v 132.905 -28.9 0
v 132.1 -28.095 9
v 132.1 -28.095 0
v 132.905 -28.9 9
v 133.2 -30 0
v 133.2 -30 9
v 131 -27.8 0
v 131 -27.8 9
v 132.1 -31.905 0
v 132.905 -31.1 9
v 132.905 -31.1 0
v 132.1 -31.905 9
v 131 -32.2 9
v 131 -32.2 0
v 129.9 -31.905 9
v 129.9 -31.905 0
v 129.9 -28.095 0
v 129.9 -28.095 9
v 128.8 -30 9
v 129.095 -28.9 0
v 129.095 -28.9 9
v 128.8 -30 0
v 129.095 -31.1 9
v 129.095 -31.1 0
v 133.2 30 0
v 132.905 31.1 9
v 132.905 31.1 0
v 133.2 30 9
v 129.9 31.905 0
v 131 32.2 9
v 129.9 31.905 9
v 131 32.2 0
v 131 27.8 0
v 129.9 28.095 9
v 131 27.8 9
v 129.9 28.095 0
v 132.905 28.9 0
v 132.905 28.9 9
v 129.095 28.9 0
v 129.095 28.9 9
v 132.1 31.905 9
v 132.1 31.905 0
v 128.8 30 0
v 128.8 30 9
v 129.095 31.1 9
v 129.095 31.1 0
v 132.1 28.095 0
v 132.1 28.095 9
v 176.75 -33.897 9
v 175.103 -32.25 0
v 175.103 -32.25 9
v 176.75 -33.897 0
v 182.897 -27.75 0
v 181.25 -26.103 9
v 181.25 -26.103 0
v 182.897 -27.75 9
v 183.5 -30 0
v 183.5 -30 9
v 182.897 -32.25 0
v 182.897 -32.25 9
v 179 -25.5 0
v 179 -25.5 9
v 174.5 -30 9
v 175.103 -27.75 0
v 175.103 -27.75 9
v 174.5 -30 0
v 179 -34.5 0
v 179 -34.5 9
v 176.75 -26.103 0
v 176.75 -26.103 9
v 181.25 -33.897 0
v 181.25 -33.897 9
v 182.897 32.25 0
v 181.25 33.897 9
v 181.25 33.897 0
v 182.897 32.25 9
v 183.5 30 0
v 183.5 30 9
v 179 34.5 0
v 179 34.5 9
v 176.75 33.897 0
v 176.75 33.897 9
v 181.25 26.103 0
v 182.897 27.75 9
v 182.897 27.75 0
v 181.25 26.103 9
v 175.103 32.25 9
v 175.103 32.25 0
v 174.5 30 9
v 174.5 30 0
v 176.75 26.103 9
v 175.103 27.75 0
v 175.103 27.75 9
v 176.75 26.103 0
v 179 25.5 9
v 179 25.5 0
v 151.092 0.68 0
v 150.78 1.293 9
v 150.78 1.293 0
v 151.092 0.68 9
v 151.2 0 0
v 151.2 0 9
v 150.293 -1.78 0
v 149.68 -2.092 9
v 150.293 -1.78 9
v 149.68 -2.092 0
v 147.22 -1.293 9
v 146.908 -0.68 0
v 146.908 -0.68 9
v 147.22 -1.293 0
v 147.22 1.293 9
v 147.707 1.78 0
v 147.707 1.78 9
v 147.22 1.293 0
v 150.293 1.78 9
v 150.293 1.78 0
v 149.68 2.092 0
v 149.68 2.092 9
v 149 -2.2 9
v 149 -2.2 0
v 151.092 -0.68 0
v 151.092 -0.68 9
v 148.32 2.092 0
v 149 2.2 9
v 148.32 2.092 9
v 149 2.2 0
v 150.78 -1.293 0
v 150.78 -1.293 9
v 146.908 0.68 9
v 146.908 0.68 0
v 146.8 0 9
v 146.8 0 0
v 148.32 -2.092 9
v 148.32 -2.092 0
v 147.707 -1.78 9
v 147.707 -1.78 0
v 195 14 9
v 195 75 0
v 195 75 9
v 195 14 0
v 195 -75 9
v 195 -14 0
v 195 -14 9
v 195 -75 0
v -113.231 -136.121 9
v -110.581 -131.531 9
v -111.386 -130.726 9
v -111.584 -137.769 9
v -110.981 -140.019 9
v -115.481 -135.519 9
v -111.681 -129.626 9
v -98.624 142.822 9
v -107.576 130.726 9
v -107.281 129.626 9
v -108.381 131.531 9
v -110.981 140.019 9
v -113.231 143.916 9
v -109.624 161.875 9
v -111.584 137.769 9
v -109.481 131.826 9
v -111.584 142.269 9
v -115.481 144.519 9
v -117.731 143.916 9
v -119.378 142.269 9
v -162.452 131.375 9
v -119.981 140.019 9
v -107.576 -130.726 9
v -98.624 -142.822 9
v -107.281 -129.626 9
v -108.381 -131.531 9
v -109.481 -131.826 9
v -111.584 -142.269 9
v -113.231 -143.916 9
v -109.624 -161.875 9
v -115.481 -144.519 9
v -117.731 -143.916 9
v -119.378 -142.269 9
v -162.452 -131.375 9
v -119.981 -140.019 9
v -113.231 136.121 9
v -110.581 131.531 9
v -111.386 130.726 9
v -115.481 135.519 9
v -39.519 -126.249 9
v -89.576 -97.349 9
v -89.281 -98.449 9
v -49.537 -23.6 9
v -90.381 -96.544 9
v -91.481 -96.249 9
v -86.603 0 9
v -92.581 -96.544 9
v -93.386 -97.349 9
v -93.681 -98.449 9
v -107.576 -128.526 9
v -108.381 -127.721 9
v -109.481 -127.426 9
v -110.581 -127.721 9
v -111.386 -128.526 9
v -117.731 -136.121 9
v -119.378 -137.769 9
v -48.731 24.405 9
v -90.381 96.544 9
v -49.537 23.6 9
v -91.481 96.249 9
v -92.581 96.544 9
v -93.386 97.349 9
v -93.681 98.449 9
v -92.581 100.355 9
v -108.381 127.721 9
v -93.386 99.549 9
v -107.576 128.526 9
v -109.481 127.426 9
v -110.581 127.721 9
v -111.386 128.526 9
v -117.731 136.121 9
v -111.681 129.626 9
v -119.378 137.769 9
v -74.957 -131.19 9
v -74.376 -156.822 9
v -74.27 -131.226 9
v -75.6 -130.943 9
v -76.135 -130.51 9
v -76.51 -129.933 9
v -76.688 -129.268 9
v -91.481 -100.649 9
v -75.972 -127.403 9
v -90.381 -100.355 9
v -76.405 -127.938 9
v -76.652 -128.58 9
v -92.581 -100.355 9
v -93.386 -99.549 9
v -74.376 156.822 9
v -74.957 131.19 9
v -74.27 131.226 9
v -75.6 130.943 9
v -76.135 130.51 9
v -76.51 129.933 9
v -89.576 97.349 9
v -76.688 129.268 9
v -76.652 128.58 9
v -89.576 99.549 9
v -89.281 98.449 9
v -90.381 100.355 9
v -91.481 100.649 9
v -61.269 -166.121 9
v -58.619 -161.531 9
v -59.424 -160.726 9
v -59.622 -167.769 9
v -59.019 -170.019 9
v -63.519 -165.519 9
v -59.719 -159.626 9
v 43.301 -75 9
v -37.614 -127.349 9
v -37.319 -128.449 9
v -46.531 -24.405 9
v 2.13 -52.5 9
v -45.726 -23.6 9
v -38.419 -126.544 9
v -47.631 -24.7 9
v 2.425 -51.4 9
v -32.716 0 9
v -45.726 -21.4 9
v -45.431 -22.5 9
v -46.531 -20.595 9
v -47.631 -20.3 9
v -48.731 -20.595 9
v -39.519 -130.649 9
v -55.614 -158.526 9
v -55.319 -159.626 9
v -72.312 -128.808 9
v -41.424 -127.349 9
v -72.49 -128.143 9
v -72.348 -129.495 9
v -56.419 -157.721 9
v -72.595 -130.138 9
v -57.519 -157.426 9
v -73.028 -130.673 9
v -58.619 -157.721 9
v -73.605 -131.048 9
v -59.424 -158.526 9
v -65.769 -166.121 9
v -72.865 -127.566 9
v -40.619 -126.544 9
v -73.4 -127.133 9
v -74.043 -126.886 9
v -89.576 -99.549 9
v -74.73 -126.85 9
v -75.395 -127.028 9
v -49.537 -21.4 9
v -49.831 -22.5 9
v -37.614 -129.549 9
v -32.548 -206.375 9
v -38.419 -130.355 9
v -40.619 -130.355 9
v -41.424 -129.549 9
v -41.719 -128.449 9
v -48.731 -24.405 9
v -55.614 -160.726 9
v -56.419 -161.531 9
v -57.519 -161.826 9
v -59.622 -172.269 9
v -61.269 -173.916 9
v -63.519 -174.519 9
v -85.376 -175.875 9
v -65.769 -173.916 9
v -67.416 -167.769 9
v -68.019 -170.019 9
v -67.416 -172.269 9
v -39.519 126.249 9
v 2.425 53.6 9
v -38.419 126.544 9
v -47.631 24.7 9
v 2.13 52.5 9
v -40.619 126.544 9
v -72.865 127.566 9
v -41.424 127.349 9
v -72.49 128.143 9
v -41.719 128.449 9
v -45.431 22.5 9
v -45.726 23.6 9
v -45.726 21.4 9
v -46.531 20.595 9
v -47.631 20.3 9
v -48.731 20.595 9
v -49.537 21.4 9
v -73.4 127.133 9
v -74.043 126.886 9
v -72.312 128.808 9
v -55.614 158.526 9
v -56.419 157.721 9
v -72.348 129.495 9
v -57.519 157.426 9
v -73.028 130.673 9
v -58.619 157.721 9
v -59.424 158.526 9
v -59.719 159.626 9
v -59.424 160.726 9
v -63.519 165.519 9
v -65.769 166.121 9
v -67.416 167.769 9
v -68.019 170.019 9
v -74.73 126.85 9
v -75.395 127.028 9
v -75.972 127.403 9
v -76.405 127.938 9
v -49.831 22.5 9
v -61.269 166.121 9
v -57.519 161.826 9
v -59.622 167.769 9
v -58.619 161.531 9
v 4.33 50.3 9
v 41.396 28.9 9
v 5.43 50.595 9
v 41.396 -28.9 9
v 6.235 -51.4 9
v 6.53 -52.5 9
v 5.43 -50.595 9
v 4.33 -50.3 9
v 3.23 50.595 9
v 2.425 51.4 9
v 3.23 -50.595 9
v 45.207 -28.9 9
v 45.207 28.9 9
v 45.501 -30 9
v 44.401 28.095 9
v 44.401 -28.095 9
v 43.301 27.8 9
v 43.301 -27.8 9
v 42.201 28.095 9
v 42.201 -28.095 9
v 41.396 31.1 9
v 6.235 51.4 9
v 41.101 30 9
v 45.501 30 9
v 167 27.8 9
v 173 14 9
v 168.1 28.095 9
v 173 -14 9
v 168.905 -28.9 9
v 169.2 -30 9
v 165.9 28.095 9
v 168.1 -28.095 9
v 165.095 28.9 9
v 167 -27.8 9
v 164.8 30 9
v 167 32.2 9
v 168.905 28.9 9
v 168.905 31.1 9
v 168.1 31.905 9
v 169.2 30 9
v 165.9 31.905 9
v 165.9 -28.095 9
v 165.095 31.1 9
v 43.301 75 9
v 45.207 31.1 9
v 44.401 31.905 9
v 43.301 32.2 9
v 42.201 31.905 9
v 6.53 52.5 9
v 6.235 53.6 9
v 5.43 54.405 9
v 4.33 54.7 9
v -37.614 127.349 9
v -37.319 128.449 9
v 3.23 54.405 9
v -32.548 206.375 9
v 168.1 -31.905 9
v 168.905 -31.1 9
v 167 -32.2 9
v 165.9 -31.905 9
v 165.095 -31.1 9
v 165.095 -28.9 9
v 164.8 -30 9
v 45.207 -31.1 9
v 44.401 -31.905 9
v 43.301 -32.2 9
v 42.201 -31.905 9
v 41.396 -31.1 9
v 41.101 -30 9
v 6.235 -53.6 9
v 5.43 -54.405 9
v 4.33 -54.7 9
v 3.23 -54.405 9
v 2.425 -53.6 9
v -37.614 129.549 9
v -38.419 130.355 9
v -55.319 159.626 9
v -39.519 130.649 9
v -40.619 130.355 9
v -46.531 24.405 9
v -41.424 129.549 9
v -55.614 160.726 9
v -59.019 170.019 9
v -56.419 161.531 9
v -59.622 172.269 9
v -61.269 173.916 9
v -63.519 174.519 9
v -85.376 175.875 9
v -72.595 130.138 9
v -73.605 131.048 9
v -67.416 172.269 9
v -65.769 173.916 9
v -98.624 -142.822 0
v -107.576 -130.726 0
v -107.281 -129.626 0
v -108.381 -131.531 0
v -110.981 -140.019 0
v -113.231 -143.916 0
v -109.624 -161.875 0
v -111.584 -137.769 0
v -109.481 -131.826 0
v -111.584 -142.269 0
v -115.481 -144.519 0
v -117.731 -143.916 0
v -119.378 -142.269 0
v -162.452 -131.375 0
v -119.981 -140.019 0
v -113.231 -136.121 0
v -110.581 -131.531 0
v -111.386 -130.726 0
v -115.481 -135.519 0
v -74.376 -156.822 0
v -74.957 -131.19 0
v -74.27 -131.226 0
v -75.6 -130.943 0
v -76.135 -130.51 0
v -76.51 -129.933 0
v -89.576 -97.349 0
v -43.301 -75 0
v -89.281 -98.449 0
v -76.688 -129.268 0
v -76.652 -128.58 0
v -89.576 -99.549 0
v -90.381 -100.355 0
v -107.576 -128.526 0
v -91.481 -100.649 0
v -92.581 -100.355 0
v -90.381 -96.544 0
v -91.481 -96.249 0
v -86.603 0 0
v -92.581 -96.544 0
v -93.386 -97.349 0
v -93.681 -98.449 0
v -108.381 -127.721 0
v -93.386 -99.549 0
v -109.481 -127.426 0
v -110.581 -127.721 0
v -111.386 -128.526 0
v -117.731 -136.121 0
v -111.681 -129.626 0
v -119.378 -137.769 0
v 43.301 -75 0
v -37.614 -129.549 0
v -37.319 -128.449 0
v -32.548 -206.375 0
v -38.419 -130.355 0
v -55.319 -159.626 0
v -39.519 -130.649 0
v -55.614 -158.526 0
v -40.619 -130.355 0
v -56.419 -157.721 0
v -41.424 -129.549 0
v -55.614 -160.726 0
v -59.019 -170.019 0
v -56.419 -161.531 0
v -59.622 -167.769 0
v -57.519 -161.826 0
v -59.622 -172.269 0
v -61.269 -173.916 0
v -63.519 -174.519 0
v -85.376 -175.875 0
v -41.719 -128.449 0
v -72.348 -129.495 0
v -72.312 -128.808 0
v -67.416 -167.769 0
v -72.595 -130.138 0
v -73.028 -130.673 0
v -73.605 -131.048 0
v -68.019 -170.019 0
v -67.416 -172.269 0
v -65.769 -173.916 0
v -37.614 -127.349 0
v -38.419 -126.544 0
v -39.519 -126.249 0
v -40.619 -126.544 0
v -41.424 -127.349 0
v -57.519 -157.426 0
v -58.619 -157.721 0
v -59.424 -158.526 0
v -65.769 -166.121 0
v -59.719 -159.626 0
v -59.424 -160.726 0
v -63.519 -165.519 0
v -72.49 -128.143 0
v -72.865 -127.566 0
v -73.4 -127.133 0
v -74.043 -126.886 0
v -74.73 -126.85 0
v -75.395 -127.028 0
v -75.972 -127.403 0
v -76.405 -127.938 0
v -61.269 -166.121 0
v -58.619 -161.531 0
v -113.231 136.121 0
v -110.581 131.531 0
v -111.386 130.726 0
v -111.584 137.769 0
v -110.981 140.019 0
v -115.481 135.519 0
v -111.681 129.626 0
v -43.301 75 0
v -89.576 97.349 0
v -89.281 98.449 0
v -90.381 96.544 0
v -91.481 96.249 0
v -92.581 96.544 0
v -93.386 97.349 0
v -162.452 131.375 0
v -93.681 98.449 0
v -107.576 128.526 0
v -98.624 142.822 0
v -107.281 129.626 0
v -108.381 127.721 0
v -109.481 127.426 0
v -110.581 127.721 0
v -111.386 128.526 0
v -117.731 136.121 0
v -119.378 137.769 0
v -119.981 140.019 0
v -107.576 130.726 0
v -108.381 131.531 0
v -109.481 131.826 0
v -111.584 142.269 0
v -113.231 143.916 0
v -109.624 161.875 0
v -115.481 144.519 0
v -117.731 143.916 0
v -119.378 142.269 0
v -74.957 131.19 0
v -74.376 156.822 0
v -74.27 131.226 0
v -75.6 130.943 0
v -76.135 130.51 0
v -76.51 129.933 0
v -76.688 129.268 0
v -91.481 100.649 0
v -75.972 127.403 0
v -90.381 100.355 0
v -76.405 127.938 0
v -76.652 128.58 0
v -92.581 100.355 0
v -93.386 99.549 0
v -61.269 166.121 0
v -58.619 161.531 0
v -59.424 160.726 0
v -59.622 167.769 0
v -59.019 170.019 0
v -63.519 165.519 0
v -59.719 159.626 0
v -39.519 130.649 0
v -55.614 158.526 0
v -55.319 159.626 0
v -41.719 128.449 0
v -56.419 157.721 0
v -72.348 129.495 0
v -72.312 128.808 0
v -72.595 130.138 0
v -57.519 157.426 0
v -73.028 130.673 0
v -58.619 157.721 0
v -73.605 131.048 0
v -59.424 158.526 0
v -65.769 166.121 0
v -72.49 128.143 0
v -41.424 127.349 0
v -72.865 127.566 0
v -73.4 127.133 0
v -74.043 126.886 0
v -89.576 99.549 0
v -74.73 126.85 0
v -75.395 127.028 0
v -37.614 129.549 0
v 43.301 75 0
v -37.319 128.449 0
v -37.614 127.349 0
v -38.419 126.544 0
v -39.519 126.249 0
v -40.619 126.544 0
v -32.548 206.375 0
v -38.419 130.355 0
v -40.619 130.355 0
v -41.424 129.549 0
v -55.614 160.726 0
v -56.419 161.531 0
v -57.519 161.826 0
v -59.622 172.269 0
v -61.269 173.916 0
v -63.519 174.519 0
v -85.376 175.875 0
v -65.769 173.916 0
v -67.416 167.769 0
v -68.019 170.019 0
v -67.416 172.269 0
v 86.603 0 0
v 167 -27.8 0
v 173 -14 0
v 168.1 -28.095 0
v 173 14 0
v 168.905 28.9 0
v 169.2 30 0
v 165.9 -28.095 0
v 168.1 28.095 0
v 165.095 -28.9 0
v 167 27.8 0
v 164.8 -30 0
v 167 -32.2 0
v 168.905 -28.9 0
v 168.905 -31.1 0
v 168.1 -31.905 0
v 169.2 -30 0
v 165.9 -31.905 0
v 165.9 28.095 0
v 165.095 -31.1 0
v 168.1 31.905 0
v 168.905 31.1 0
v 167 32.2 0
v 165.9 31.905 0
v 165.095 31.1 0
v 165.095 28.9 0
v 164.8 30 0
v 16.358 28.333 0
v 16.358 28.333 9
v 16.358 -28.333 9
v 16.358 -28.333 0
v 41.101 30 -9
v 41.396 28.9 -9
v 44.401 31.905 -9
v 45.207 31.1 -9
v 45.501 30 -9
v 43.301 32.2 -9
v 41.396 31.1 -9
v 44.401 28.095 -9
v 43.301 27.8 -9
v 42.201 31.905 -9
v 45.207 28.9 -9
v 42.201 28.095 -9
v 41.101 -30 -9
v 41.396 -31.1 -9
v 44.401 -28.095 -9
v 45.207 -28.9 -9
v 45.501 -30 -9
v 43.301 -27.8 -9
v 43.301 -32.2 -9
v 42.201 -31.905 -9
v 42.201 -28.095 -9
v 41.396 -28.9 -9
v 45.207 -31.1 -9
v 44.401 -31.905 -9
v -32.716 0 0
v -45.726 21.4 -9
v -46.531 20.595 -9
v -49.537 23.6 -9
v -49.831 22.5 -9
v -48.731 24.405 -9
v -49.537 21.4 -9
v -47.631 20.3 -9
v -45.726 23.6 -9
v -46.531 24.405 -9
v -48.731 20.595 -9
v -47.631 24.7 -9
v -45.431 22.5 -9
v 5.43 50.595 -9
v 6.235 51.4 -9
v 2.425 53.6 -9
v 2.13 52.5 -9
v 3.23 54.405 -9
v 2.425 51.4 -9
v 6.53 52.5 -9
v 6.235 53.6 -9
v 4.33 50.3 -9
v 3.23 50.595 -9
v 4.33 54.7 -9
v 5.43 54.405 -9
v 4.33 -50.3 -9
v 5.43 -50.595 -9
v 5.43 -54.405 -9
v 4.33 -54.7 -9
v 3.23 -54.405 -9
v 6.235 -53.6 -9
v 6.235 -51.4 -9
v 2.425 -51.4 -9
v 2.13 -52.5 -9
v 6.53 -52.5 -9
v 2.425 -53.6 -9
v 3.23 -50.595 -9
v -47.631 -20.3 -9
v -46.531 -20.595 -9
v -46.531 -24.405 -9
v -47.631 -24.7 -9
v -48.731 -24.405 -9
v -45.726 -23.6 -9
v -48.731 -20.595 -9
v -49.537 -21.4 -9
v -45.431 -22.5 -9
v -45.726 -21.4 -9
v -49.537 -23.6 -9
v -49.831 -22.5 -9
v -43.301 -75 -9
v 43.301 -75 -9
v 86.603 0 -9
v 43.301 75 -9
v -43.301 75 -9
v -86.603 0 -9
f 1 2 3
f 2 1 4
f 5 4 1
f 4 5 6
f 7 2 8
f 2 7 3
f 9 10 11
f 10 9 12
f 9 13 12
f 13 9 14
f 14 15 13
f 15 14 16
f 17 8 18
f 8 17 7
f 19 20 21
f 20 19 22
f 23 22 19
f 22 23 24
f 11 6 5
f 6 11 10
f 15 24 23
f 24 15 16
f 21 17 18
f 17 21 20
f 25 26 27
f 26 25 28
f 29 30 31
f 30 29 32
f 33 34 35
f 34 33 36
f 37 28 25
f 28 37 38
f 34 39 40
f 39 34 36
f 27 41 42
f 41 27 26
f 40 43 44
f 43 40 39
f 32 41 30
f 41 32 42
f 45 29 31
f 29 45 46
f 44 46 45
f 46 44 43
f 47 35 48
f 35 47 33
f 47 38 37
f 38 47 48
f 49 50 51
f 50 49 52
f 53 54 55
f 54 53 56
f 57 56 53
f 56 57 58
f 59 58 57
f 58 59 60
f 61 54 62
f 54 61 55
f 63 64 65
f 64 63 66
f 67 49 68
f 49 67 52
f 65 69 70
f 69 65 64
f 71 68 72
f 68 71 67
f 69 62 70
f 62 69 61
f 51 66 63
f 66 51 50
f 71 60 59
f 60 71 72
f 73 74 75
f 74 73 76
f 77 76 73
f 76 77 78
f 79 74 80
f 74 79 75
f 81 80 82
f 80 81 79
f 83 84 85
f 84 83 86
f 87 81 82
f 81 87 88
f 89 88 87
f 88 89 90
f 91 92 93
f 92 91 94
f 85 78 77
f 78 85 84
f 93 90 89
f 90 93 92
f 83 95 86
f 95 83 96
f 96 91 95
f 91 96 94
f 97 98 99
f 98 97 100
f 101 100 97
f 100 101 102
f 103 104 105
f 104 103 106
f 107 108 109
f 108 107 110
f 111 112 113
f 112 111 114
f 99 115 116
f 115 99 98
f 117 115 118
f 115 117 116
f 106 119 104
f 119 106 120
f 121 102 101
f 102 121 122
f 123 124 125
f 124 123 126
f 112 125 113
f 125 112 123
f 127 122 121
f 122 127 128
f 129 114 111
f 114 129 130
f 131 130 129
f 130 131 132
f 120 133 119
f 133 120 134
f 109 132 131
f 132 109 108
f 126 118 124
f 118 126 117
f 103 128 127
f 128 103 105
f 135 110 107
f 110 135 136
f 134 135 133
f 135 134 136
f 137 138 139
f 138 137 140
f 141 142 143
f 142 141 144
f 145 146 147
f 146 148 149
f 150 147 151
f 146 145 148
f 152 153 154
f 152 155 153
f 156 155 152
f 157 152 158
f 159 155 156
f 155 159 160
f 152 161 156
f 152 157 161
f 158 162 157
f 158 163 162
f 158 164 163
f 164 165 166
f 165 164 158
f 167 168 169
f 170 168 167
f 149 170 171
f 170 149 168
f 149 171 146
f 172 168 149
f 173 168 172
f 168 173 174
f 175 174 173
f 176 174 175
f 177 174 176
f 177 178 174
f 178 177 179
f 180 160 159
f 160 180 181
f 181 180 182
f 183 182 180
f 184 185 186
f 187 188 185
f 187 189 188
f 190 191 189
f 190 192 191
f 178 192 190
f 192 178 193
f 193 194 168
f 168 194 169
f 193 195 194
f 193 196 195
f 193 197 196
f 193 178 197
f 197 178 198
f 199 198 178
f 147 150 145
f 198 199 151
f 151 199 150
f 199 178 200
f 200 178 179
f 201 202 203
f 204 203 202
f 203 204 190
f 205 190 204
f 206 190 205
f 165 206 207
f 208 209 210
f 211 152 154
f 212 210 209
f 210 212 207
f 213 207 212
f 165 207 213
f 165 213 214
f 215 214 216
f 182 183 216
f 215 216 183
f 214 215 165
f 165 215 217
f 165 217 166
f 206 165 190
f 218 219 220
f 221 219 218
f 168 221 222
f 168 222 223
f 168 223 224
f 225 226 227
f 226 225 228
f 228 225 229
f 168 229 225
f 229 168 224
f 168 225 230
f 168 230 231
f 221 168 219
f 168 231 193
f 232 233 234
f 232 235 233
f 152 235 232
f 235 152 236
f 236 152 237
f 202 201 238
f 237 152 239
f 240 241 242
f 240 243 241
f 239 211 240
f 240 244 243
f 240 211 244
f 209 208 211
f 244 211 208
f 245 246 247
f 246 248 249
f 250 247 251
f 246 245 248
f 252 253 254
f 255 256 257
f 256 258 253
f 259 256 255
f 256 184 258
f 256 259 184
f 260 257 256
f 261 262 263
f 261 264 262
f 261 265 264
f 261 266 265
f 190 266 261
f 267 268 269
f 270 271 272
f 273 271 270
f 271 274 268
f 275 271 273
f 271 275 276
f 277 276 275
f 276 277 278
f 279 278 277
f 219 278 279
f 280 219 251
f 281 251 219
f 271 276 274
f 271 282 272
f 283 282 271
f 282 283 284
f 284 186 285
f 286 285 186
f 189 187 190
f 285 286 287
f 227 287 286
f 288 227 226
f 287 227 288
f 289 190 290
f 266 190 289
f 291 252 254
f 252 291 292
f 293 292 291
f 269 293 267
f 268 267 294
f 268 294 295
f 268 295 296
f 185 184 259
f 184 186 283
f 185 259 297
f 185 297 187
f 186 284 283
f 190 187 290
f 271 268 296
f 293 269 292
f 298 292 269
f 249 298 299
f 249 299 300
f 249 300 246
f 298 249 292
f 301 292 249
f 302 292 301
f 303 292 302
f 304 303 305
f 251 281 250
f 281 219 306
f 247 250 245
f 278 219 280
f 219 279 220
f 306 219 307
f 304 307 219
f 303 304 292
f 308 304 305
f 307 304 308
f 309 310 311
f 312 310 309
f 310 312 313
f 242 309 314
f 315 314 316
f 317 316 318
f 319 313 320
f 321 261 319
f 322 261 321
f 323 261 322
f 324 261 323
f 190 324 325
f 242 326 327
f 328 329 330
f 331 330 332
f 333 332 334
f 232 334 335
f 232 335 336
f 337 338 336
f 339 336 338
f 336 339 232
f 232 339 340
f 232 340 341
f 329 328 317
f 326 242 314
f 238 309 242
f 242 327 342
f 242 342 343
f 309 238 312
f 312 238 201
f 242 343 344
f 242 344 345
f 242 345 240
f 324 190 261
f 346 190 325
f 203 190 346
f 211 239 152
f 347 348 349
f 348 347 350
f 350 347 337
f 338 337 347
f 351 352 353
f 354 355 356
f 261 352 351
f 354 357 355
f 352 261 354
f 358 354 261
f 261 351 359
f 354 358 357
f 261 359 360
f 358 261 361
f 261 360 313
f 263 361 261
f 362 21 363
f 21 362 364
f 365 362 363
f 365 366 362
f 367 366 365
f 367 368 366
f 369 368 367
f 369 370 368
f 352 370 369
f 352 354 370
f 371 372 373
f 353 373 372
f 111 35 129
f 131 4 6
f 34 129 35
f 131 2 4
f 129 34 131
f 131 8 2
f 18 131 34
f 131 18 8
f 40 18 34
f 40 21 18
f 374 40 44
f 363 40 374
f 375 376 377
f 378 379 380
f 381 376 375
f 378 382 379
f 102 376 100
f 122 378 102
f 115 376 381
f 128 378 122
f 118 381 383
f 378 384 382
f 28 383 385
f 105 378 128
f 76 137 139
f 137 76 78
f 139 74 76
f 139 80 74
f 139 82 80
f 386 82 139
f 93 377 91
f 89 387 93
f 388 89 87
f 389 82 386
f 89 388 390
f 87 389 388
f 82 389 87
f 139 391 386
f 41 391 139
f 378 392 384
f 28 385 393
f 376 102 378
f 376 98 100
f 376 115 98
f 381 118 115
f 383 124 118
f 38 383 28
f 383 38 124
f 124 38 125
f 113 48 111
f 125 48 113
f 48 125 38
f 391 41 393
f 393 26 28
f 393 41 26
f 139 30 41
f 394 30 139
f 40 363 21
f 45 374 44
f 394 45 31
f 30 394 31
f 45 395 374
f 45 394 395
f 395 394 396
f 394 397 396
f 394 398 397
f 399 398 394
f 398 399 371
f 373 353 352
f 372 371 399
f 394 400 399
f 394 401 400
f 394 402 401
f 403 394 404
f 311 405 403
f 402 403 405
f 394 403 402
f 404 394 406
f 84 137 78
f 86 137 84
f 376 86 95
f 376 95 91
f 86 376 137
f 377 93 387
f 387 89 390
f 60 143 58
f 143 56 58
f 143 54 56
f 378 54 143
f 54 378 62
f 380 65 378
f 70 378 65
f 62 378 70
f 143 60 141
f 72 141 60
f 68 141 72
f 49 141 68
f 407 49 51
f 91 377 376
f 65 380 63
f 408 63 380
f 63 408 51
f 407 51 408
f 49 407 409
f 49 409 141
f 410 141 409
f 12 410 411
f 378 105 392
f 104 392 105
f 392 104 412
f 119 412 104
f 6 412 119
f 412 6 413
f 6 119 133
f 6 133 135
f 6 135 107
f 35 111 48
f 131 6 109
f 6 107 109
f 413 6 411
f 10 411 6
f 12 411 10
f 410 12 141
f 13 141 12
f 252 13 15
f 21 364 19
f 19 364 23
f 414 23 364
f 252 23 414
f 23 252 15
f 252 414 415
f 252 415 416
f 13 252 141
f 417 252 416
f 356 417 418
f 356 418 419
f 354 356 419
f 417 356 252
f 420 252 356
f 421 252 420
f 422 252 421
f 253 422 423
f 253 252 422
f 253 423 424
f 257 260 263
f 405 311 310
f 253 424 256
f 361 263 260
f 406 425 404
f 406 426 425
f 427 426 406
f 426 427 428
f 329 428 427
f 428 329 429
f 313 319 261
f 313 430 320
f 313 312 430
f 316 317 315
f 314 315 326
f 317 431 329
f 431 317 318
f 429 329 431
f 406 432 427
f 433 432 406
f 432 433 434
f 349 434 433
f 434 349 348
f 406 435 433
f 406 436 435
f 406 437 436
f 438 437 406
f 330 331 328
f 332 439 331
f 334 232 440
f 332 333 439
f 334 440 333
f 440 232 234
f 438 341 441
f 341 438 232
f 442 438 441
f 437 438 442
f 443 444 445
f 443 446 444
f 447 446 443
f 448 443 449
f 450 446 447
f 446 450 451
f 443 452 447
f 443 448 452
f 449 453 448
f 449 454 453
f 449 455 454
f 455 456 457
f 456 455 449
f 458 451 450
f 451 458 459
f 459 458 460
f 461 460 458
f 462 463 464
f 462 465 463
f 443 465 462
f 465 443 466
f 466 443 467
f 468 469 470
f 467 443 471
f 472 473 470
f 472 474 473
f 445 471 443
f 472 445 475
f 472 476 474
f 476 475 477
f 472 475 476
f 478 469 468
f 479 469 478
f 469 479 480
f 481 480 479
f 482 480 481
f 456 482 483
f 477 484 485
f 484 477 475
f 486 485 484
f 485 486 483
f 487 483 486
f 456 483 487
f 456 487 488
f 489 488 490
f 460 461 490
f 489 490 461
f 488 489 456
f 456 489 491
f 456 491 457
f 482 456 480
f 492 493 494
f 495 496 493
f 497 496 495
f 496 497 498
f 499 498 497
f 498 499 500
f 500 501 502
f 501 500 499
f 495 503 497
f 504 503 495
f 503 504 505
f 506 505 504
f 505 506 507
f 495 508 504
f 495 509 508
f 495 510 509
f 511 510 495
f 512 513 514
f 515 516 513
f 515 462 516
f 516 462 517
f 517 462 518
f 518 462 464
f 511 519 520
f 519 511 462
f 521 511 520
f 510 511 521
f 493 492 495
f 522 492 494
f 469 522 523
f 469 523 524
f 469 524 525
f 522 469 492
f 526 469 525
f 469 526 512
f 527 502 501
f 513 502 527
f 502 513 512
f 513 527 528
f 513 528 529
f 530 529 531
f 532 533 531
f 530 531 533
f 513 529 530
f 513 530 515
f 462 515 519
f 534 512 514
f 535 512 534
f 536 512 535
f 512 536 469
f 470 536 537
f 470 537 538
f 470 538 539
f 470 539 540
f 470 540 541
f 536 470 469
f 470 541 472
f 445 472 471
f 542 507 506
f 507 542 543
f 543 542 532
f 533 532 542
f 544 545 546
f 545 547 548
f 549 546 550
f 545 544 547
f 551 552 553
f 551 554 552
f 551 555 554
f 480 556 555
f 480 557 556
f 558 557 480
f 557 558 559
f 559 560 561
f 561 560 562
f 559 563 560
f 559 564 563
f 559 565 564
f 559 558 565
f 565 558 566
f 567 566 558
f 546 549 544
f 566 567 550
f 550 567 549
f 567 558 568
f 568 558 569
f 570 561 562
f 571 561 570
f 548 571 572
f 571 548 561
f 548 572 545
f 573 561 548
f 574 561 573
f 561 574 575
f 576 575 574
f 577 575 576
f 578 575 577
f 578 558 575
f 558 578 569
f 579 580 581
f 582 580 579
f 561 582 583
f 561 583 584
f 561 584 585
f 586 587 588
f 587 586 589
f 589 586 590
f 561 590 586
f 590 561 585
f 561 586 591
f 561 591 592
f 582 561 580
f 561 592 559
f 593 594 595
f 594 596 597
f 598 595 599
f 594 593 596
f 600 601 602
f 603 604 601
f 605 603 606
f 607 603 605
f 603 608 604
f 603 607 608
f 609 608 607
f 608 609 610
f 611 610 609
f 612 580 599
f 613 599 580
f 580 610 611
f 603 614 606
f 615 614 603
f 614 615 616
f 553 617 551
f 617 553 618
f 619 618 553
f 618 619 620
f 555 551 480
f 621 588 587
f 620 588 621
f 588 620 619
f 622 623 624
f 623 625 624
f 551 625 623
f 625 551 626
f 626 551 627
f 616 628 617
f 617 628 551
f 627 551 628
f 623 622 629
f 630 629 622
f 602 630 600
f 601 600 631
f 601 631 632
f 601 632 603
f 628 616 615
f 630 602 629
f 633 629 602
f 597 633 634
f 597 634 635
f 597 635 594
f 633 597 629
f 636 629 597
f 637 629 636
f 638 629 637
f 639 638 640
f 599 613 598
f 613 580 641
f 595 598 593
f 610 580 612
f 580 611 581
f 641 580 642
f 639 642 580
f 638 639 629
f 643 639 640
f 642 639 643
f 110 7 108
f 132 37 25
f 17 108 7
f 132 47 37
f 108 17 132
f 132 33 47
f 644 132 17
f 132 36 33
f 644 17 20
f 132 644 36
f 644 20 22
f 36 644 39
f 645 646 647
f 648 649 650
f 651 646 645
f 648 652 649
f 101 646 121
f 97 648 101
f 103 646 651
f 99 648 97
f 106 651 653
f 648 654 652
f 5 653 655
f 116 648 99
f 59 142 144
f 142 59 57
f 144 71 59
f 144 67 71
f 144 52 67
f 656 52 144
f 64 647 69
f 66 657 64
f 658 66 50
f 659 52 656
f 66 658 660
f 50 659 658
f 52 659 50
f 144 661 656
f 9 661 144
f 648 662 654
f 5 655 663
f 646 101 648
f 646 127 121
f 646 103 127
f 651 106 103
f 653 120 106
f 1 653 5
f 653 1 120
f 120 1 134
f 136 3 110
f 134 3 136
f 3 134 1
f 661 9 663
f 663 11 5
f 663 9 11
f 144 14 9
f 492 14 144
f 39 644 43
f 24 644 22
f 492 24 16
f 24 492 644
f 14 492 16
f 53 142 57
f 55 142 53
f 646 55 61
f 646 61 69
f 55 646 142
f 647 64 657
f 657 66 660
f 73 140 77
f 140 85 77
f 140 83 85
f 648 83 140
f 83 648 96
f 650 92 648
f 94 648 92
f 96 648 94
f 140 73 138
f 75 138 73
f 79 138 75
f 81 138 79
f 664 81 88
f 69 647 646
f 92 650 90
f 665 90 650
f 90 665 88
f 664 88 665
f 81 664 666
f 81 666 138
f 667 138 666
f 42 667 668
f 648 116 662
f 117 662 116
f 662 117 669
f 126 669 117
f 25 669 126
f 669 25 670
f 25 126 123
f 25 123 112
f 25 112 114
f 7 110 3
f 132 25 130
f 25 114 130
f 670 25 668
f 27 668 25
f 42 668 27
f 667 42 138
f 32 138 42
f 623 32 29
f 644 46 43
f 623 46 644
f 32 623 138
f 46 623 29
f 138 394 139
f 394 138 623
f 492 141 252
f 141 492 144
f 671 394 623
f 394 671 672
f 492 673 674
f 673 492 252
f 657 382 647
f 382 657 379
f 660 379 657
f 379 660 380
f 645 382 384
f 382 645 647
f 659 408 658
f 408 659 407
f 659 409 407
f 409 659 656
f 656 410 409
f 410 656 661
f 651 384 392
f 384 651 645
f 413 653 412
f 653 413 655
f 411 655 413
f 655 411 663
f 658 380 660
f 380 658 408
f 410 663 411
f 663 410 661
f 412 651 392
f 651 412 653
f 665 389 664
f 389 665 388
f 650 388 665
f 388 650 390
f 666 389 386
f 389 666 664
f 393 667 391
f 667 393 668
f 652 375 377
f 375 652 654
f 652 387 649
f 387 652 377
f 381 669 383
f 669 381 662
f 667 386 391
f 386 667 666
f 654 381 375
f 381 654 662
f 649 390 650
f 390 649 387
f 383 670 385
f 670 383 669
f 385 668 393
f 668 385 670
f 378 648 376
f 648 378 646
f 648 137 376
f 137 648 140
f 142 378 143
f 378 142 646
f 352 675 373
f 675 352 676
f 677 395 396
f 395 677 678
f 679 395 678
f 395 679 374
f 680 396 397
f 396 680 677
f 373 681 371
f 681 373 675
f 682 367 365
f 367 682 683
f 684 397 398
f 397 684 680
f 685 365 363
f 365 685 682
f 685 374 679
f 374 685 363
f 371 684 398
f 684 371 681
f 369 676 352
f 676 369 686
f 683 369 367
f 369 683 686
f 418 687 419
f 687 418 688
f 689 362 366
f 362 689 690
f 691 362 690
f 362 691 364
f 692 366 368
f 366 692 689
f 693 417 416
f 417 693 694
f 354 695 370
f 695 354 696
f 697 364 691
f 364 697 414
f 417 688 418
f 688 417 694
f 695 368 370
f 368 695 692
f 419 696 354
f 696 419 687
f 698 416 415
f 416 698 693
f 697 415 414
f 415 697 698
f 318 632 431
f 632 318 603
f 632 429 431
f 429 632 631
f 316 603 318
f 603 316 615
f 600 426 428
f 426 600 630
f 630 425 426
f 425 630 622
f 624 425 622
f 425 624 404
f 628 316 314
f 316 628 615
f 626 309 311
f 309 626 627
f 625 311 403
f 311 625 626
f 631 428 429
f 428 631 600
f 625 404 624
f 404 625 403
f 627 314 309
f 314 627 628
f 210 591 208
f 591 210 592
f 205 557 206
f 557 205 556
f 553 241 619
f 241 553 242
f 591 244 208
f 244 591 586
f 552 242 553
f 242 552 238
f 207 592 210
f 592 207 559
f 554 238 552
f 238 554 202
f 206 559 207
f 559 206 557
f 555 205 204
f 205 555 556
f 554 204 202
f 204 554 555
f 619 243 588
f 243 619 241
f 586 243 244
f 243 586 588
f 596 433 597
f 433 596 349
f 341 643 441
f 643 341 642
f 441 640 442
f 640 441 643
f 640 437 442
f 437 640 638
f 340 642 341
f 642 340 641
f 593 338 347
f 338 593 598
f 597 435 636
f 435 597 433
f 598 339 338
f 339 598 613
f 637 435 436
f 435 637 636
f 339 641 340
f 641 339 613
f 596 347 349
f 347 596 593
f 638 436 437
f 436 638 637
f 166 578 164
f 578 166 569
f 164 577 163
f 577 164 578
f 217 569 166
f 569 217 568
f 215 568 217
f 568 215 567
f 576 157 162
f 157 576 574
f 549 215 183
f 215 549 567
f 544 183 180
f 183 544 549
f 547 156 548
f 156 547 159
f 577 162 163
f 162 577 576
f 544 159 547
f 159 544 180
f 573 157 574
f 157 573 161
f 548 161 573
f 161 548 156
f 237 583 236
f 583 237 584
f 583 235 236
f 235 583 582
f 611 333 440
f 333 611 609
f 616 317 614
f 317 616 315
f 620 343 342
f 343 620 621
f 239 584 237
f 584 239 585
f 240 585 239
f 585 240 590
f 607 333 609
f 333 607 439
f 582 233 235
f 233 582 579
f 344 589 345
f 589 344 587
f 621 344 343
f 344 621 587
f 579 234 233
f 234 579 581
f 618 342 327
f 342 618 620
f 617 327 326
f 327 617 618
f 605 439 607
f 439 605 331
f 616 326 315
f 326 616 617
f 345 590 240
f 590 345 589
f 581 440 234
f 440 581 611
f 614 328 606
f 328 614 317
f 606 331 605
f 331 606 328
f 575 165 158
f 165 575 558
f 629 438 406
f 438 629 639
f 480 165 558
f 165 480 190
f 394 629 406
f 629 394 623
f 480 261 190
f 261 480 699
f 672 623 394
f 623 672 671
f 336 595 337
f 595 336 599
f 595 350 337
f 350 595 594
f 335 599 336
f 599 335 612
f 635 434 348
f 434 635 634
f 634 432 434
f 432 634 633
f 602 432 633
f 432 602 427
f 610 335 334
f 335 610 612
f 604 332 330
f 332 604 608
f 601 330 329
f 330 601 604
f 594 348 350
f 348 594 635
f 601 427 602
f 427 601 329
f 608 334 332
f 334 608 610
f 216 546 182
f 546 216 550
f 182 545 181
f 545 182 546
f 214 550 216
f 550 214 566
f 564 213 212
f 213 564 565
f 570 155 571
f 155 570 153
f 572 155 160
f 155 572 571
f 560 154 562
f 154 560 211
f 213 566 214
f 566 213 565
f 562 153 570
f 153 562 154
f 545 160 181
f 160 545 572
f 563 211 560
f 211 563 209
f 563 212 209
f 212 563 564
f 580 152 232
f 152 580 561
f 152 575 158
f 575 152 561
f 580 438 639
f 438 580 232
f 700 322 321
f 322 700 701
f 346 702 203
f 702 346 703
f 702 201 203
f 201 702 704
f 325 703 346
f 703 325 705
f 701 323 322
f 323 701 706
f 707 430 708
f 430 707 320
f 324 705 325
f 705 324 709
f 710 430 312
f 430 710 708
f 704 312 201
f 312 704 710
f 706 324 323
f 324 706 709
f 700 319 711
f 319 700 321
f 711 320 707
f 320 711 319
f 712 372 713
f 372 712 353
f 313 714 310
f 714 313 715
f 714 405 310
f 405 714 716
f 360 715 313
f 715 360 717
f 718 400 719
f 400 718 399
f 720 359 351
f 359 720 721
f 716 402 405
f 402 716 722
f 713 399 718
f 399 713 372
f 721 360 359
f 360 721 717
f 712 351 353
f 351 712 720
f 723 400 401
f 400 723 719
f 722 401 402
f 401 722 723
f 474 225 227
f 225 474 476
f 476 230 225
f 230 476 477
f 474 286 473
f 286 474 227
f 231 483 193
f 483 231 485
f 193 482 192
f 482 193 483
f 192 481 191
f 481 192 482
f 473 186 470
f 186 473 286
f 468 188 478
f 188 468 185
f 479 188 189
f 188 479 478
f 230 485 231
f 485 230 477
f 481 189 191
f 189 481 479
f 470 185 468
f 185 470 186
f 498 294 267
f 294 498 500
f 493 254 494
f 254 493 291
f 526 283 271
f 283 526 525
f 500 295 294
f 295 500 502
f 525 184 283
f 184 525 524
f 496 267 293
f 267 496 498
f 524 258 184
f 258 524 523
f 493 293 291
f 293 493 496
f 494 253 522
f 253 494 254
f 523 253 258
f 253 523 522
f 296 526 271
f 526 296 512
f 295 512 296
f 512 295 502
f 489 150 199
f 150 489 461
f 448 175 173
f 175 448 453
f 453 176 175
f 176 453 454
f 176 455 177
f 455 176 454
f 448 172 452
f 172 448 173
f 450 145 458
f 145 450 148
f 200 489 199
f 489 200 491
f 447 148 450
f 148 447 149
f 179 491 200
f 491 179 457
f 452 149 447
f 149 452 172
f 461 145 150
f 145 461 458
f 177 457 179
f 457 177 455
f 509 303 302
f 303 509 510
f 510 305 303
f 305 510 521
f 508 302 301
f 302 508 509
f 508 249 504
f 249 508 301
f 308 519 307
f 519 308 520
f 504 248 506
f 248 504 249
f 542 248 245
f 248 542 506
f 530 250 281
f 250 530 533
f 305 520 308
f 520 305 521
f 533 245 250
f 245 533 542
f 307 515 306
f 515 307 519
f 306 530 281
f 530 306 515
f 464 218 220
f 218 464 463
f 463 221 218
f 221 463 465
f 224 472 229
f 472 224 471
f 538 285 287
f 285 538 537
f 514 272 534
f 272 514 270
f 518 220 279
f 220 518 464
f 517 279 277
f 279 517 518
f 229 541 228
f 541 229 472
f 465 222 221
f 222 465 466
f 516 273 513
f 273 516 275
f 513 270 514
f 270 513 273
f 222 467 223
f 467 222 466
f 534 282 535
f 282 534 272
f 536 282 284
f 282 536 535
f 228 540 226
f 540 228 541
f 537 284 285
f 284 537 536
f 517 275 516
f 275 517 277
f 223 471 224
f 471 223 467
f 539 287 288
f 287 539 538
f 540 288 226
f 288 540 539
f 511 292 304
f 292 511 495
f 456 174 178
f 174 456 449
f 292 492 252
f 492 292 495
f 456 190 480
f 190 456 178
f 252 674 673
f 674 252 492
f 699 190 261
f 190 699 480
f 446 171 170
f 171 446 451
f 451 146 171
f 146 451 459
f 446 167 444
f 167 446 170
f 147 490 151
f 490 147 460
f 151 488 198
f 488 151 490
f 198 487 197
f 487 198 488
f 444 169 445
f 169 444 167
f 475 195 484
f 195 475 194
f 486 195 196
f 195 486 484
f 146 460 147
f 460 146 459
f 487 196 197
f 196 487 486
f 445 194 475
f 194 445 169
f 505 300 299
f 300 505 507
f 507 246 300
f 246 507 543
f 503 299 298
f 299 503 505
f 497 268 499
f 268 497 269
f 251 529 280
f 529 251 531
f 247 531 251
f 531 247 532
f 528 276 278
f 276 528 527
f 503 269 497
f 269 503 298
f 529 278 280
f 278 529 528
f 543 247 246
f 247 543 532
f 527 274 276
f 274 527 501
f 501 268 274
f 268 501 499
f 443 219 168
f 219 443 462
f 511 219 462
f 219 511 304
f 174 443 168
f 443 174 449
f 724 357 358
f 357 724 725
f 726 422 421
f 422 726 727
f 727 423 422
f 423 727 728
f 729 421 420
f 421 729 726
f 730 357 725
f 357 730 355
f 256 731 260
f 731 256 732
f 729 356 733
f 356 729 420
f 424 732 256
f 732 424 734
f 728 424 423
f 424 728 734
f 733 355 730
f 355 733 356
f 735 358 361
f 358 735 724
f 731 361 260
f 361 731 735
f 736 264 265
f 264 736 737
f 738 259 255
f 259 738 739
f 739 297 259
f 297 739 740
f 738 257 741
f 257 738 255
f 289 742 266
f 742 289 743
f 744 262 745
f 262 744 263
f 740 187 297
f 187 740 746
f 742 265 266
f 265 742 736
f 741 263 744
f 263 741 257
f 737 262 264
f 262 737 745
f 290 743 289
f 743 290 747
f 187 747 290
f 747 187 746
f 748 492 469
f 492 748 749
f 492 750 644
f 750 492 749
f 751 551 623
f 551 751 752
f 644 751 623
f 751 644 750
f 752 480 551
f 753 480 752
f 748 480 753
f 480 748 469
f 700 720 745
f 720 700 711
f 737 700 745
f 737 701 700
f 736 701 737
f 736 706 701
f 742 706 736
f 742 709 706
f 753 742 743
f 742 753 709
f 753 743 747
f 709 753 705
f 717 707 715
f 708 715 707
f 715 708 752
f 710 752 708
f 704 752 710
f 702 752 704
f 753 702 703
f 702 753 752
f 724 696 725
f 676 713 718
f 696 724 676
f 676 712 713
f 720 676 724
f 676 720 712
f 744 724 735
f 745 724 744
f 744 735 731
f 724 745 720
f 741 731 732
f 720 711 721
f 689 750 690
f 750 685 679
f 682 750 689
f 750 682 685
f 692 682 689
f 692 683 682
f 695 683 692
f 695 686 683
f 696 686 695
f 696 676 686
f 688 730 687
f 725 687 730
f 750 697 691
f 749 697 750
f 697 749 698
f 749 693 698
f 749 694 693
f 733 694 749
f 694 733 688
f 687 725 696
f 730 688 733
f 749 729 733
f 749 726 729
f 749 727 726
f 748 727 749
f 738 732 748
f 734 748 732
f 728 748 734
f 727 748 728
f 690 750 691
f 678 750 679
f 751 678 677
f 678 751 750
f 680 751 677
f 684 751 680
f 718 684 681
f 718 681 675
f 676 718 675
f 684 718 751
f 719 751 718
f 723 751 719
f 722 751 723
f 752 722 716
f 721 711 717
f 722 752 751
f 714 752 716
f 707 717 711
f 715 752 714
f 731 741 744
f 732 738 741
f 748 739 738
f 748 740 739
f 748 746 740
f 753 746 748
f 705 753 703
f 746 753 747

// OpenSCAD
radius = 175; // pretty close to 150/cos(30)
radius2 = radius/cos(30);
extralength = 20;
belt_gap = 28;
offset = 0;
thickness = 9;
h2 = thickness*2+1;
boardwidth=150;
radius_c = boardwidth/(2*cos(30));

module single_board(bottom) {
boardlength=radius+extralength;
	difference() {
		translate([boardlength/2,0,thickness/2])
		  cube([boardlength,boardwidth,thickness],center=true);
		//Corners to cut
		rotate([0,0,-30]) translate([-40,-5,-1])
		  cube([40,boardwidth,thickness+2]);
		rotate([0,0,30]) translate([-40,5-boardwidth,-1]) 
		  cube([40,boardwidth,thickness+2]);
		//holes for motor_end
		translate([radius-8, -30, 0])
		  cylinder(r=2.2, h=h2, center=true, $fn=12);
		translate([radius-8, 30, 0])
		  cylinder(r=2.2, h=h2, center=true, $fn=12);
		//slot for belts
		translate([radius+11,0,0])
		  cube([26,belt_gap,h2],center=true); //bottom board uses 22 in original copy
		//holes for center_board
		translate([radius_c/2,30,0])
		  cylinder(r=2.2, h=h2, center=true, $fn=12);
		translate([radius_c/2,-30,0])
		  cylinder(r=2.2, h=h2, center=true, $fn=12);

		if (bottom) {
			//holes for idler_end
			translate([radius-44, -30, 0])
			  cylinder(r=2.2, h=h2, center=true, $fn=12);
			translate([radius-44, 30, 0])
			  cylinder(r=2.2, h=h2, center=true, $fn=12);
			//holes for rods
			translate([radius+4,-30,0])
			  cylinder(r=4.5,h=h2,center=true, $fn=12);
			translate([radius+4,30,0])
			  cylinder(r=4.5,h=h2,center=true, $fn=12);
			//mount holes for baseplate
			translate([radius-26,0,0])
			  cylinder(r=2.2,h=h2,center=true, $fn=20);
		}
	}
}

module center_board() {
	difference() {
		translate([0,0,-thickness/2])
		  cylinder(r=radius_c, h=thickness, center=true, $fn=6);
	for(a=[-120,0,120]) {
			rotate([0,0,a]) {
			translate([radius_c/2,30,0])
			  cylinder(r=2.2, h=h2, center=true, $fn=12);
			translate([radius_c/2,-30,0])
			  cylinder(r=2.2, h=h2, center=true, $fn=12);
		}}
	}
}

single_board(1);
rotate([0,0,120]) single_board(1);
rotate([0,0,-120]) single_board(1);
center_board();

//projection(cut=false) center_board();
//projection(cut=false) single_board(0);
//projection(cut=false) single_board(1);
